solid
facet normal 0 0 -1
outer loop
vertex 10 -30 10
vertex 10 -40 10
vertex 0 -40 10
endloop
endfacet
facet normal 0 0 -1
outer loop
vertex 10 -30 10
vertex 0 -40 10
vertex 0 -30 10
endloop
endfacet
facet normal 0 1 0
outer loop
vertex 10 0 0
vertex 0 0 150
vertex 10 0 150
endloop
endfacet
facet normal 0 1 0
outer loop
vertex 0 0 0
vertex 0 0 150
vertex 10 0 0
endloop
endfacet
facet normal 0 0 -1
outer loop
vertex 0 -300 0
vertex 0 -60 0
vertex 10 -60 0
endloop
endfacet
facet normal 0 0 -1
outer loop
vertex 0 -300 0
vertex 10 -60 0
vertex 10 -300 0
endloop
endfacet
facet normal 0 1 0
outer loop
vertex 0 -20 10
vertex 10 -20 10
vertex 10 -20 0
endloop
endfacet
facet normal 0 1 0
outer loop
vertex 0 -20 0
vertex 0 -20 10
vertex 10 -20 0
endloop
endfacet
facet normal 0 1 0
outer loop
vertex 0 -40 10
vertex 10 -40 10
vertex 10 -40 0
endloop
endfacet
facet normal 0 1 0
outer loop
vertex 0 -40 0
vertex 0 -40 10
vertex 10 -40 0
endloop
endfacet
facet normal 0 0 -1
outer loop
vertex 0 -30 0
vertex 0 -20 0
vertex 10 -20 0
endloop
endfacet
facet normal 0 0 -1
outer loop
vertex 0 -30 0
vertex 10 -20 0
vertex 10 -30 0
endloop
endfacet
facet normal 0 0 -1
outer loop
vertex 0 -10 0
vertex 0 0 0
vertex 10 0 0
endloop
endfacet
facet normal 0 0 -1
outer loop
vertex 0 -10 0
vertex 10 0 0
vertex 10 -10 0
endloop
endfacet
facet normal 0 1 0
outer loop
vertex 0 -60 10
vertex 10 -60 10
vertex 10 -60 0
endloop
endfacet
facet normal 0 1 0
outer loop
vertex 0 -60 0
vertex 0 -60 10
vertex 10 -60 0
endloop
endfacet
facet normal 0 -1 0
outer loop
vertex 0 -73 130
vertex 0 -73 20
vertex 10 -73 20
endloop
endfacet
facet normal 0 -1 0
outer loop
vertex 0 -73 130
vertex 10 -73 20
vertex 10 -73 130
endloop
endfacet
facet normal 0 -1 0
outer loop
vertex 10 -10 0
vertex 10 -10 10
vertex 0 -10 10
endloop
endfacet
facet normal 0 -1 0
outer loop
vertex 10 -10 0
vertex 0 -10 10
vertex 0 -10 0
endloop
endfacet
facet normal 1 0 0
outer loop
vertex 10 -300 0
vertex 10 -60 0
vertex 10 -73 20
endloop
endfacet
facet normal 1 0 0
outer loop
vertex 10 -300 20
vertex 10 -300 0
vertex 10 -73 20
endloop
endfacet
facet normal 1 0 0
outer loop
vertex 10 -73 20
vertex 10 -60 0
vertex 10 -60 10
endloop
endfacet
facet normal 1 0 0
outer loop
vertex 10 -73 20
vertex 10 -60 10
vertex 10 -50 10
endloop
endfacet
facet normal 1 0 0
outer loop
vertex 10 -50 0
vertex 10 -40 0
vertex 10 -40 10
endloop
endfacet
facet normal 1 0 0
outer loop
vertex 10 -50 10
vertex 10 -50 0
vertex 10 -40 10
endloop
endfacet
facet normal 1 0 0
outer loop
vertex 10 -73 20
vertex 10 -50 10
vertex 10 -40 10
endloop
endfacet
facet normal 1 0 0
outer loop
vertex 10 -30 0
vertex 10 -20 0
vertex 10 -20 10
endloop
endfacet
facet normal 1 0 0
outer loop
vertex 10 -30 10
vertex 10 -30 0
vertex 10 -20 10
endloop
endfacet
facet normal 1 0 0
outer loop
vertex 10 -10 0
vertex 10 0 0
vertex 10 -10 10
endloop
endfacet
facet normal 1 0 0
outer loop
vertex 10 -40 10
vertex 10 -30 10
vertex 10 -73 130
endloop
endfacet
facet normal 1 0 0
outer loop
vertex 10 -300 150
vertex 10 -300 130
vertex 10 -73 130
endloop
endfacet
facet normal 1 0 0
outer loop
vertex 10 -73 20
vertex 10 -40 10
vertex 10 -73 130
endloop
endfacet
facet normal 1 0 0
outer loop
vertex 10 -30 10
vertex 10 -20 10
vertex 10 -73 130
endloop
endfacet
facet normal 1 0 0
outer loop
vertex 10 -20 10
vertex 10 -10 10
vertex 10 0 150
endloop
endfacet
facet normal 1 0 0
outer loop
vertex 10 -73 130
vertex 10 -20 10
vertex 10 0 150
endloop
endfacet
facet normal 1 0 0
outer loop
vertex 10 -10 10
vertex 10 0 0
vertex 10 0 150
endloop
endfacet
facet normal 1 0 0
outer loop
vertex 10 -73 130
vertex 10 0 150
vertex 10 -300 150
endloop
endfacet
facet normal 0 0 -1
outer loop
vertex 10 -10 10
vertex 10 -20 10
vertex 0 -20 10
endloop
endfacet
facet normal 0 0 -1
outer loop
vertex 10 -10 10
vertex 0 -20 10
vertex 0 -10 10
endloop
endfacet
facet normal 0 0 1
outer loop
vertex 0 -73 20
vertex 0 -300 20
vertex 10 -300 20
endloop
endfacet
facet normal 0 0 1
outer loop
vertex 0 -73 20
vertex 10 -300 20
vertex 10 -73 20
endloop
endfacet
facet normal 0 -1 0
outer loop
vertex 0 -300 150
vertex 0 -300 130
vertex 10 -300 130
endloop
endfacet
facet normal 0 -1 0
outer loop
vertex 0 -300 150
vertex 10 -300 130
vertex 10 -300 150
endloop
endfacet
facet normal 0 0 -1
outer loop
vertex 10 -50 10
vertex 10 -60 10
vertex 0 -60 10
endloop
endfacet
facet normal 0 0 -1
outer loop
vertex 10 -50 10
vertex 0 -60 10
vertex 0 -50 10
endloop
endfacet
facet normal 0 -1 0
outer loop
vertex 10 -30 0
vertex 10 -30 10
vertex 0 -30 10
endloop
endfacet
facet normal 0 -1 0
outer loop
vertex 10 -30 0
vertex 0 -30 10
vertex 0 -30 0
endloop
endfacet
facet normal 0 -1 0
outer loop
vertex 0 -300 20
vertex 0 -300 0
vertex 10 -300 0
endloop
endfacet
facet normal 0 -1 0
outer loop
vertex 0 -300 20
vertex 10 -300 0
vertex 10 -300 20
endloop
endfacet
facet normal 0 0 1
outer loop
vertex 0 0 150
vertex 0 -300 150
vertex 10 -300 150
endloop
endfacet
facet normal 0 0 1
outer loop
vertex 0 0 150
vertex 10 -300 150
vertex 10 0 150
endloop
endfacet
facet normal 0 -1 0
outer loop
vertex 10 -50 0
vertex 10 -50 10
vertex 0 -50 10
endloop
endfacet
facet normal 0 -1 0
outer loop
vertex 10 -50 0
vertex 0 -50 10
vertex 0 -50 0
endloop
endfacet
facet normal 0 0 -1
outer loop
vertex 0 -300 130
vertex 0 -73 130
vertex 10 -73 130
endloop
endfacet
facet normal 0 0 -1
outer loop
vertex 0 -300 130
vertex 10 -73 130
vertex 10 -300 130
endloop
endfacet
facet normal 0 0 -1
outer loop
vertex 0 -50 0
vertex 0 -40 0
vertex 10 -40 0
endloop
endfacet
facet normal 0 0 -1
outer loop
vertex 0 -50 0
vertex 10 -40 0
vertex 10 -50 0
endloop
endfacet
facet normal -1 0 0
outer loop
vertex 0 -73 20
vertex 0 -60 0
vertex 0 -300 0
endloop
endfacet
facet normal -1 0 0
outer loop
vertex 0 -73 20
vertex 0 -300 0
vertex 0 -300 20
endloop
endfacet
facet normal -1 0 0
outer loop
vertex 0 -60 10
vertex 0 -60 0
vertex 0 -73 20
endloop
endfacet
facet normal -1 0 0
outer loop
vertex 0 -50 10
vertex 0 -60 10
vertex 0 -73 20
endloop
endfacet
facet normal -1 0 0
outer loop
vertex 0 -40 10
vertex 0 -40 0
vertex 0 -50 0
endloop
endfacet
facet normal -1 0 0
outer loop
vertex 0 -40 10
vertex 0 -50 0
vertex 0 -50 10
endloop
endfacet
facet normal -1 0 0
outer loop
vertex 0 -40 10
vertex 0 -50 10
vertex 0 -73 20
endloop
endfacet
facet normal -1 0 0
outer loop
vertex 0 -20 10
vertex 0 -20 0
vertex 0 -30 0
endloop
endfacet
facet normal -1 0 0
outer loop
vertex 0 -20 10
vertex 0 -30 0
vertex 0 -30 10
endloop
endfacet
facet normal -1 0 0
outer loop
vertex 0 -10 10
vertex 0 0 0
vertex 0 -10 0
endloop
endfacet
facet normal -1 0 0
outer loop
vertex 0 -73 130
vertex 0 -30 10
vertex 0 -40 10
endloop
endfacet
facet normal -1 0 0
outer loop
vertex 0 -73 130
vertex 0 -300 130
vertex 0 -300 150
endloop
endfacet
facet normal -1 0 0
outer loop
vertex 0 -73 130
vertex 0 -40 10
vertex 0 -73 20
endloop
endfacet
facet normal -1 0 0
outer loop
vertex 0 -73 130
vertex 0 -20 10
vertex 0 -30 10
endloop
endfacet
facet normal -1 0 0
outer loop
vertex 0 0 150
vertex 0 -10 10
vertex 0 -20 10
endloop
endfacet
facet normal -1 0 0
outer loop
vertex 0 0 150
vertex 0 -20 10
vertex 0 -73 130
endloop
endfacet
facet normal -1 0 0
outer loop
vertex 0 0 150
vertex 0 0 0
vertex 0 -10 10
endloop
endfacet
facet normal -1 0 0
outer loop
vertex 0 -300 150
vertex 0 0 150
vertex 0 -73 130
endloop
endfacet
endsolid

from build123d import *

# Parameters (mm, degrees)
BOSS_EXTRU_1_DEPTH         = 10
ESQUISSE2_W                = 10
ESQUISSE2_H                = 10
ENL_V_MAT_EXTRU_1_DEPTH    = 10
R_P_TITION_LIN_AIRE1_COUNT = 3
R_P_TITION_LIN_AIRE1_PITCH = 20


with BuildPart() as part:
    # Esquisse1 → Boss.-Extru.1 (new body)
    with BuildSketch(Plane(origin=(0, 0, 0), x_dir=(0, 0, -1), z_dir=(1, 0, 0))):
        Polygon((0, -300), (-20, -300), (-20, -73), (-130, -73), (-130, -300), (-150, -300), (-150, 0), (0, 0), align=None)
    extrude(amount=BOSS_EXTRU_1_DEPTH)

    # Esquisse2 → Enlèv. mat.-Extru.1 (cut)
    with BuildSketch(Plane(origin=(10, 0, 0), x_dir=(0, 0, -1), z_dir=(1, 0, 0))):
        with Locations((-5, -15)):
            Rectangle(ESQUISSE2_W, ESQUISSE2_H)
    enl_v_mat_extru_1 = extrude(amount=-ENL_V_MAT_EXTRU_1_DEPTH, mode=Mode.SUBTRACT)

    # Répétition linéaire1: Enlèv. mat.-Extru.1 ×3
    with Locations(*[(0, -i * R_P_TITION_LIN_AIRE1_PITCH, 0) for i in range(1, R_P_TITION_LIN_AIRE1_COUNT)]):
        add(enl_v_mat_extru_1, mode=Mode.SUBTRACT)


solid = part.part
